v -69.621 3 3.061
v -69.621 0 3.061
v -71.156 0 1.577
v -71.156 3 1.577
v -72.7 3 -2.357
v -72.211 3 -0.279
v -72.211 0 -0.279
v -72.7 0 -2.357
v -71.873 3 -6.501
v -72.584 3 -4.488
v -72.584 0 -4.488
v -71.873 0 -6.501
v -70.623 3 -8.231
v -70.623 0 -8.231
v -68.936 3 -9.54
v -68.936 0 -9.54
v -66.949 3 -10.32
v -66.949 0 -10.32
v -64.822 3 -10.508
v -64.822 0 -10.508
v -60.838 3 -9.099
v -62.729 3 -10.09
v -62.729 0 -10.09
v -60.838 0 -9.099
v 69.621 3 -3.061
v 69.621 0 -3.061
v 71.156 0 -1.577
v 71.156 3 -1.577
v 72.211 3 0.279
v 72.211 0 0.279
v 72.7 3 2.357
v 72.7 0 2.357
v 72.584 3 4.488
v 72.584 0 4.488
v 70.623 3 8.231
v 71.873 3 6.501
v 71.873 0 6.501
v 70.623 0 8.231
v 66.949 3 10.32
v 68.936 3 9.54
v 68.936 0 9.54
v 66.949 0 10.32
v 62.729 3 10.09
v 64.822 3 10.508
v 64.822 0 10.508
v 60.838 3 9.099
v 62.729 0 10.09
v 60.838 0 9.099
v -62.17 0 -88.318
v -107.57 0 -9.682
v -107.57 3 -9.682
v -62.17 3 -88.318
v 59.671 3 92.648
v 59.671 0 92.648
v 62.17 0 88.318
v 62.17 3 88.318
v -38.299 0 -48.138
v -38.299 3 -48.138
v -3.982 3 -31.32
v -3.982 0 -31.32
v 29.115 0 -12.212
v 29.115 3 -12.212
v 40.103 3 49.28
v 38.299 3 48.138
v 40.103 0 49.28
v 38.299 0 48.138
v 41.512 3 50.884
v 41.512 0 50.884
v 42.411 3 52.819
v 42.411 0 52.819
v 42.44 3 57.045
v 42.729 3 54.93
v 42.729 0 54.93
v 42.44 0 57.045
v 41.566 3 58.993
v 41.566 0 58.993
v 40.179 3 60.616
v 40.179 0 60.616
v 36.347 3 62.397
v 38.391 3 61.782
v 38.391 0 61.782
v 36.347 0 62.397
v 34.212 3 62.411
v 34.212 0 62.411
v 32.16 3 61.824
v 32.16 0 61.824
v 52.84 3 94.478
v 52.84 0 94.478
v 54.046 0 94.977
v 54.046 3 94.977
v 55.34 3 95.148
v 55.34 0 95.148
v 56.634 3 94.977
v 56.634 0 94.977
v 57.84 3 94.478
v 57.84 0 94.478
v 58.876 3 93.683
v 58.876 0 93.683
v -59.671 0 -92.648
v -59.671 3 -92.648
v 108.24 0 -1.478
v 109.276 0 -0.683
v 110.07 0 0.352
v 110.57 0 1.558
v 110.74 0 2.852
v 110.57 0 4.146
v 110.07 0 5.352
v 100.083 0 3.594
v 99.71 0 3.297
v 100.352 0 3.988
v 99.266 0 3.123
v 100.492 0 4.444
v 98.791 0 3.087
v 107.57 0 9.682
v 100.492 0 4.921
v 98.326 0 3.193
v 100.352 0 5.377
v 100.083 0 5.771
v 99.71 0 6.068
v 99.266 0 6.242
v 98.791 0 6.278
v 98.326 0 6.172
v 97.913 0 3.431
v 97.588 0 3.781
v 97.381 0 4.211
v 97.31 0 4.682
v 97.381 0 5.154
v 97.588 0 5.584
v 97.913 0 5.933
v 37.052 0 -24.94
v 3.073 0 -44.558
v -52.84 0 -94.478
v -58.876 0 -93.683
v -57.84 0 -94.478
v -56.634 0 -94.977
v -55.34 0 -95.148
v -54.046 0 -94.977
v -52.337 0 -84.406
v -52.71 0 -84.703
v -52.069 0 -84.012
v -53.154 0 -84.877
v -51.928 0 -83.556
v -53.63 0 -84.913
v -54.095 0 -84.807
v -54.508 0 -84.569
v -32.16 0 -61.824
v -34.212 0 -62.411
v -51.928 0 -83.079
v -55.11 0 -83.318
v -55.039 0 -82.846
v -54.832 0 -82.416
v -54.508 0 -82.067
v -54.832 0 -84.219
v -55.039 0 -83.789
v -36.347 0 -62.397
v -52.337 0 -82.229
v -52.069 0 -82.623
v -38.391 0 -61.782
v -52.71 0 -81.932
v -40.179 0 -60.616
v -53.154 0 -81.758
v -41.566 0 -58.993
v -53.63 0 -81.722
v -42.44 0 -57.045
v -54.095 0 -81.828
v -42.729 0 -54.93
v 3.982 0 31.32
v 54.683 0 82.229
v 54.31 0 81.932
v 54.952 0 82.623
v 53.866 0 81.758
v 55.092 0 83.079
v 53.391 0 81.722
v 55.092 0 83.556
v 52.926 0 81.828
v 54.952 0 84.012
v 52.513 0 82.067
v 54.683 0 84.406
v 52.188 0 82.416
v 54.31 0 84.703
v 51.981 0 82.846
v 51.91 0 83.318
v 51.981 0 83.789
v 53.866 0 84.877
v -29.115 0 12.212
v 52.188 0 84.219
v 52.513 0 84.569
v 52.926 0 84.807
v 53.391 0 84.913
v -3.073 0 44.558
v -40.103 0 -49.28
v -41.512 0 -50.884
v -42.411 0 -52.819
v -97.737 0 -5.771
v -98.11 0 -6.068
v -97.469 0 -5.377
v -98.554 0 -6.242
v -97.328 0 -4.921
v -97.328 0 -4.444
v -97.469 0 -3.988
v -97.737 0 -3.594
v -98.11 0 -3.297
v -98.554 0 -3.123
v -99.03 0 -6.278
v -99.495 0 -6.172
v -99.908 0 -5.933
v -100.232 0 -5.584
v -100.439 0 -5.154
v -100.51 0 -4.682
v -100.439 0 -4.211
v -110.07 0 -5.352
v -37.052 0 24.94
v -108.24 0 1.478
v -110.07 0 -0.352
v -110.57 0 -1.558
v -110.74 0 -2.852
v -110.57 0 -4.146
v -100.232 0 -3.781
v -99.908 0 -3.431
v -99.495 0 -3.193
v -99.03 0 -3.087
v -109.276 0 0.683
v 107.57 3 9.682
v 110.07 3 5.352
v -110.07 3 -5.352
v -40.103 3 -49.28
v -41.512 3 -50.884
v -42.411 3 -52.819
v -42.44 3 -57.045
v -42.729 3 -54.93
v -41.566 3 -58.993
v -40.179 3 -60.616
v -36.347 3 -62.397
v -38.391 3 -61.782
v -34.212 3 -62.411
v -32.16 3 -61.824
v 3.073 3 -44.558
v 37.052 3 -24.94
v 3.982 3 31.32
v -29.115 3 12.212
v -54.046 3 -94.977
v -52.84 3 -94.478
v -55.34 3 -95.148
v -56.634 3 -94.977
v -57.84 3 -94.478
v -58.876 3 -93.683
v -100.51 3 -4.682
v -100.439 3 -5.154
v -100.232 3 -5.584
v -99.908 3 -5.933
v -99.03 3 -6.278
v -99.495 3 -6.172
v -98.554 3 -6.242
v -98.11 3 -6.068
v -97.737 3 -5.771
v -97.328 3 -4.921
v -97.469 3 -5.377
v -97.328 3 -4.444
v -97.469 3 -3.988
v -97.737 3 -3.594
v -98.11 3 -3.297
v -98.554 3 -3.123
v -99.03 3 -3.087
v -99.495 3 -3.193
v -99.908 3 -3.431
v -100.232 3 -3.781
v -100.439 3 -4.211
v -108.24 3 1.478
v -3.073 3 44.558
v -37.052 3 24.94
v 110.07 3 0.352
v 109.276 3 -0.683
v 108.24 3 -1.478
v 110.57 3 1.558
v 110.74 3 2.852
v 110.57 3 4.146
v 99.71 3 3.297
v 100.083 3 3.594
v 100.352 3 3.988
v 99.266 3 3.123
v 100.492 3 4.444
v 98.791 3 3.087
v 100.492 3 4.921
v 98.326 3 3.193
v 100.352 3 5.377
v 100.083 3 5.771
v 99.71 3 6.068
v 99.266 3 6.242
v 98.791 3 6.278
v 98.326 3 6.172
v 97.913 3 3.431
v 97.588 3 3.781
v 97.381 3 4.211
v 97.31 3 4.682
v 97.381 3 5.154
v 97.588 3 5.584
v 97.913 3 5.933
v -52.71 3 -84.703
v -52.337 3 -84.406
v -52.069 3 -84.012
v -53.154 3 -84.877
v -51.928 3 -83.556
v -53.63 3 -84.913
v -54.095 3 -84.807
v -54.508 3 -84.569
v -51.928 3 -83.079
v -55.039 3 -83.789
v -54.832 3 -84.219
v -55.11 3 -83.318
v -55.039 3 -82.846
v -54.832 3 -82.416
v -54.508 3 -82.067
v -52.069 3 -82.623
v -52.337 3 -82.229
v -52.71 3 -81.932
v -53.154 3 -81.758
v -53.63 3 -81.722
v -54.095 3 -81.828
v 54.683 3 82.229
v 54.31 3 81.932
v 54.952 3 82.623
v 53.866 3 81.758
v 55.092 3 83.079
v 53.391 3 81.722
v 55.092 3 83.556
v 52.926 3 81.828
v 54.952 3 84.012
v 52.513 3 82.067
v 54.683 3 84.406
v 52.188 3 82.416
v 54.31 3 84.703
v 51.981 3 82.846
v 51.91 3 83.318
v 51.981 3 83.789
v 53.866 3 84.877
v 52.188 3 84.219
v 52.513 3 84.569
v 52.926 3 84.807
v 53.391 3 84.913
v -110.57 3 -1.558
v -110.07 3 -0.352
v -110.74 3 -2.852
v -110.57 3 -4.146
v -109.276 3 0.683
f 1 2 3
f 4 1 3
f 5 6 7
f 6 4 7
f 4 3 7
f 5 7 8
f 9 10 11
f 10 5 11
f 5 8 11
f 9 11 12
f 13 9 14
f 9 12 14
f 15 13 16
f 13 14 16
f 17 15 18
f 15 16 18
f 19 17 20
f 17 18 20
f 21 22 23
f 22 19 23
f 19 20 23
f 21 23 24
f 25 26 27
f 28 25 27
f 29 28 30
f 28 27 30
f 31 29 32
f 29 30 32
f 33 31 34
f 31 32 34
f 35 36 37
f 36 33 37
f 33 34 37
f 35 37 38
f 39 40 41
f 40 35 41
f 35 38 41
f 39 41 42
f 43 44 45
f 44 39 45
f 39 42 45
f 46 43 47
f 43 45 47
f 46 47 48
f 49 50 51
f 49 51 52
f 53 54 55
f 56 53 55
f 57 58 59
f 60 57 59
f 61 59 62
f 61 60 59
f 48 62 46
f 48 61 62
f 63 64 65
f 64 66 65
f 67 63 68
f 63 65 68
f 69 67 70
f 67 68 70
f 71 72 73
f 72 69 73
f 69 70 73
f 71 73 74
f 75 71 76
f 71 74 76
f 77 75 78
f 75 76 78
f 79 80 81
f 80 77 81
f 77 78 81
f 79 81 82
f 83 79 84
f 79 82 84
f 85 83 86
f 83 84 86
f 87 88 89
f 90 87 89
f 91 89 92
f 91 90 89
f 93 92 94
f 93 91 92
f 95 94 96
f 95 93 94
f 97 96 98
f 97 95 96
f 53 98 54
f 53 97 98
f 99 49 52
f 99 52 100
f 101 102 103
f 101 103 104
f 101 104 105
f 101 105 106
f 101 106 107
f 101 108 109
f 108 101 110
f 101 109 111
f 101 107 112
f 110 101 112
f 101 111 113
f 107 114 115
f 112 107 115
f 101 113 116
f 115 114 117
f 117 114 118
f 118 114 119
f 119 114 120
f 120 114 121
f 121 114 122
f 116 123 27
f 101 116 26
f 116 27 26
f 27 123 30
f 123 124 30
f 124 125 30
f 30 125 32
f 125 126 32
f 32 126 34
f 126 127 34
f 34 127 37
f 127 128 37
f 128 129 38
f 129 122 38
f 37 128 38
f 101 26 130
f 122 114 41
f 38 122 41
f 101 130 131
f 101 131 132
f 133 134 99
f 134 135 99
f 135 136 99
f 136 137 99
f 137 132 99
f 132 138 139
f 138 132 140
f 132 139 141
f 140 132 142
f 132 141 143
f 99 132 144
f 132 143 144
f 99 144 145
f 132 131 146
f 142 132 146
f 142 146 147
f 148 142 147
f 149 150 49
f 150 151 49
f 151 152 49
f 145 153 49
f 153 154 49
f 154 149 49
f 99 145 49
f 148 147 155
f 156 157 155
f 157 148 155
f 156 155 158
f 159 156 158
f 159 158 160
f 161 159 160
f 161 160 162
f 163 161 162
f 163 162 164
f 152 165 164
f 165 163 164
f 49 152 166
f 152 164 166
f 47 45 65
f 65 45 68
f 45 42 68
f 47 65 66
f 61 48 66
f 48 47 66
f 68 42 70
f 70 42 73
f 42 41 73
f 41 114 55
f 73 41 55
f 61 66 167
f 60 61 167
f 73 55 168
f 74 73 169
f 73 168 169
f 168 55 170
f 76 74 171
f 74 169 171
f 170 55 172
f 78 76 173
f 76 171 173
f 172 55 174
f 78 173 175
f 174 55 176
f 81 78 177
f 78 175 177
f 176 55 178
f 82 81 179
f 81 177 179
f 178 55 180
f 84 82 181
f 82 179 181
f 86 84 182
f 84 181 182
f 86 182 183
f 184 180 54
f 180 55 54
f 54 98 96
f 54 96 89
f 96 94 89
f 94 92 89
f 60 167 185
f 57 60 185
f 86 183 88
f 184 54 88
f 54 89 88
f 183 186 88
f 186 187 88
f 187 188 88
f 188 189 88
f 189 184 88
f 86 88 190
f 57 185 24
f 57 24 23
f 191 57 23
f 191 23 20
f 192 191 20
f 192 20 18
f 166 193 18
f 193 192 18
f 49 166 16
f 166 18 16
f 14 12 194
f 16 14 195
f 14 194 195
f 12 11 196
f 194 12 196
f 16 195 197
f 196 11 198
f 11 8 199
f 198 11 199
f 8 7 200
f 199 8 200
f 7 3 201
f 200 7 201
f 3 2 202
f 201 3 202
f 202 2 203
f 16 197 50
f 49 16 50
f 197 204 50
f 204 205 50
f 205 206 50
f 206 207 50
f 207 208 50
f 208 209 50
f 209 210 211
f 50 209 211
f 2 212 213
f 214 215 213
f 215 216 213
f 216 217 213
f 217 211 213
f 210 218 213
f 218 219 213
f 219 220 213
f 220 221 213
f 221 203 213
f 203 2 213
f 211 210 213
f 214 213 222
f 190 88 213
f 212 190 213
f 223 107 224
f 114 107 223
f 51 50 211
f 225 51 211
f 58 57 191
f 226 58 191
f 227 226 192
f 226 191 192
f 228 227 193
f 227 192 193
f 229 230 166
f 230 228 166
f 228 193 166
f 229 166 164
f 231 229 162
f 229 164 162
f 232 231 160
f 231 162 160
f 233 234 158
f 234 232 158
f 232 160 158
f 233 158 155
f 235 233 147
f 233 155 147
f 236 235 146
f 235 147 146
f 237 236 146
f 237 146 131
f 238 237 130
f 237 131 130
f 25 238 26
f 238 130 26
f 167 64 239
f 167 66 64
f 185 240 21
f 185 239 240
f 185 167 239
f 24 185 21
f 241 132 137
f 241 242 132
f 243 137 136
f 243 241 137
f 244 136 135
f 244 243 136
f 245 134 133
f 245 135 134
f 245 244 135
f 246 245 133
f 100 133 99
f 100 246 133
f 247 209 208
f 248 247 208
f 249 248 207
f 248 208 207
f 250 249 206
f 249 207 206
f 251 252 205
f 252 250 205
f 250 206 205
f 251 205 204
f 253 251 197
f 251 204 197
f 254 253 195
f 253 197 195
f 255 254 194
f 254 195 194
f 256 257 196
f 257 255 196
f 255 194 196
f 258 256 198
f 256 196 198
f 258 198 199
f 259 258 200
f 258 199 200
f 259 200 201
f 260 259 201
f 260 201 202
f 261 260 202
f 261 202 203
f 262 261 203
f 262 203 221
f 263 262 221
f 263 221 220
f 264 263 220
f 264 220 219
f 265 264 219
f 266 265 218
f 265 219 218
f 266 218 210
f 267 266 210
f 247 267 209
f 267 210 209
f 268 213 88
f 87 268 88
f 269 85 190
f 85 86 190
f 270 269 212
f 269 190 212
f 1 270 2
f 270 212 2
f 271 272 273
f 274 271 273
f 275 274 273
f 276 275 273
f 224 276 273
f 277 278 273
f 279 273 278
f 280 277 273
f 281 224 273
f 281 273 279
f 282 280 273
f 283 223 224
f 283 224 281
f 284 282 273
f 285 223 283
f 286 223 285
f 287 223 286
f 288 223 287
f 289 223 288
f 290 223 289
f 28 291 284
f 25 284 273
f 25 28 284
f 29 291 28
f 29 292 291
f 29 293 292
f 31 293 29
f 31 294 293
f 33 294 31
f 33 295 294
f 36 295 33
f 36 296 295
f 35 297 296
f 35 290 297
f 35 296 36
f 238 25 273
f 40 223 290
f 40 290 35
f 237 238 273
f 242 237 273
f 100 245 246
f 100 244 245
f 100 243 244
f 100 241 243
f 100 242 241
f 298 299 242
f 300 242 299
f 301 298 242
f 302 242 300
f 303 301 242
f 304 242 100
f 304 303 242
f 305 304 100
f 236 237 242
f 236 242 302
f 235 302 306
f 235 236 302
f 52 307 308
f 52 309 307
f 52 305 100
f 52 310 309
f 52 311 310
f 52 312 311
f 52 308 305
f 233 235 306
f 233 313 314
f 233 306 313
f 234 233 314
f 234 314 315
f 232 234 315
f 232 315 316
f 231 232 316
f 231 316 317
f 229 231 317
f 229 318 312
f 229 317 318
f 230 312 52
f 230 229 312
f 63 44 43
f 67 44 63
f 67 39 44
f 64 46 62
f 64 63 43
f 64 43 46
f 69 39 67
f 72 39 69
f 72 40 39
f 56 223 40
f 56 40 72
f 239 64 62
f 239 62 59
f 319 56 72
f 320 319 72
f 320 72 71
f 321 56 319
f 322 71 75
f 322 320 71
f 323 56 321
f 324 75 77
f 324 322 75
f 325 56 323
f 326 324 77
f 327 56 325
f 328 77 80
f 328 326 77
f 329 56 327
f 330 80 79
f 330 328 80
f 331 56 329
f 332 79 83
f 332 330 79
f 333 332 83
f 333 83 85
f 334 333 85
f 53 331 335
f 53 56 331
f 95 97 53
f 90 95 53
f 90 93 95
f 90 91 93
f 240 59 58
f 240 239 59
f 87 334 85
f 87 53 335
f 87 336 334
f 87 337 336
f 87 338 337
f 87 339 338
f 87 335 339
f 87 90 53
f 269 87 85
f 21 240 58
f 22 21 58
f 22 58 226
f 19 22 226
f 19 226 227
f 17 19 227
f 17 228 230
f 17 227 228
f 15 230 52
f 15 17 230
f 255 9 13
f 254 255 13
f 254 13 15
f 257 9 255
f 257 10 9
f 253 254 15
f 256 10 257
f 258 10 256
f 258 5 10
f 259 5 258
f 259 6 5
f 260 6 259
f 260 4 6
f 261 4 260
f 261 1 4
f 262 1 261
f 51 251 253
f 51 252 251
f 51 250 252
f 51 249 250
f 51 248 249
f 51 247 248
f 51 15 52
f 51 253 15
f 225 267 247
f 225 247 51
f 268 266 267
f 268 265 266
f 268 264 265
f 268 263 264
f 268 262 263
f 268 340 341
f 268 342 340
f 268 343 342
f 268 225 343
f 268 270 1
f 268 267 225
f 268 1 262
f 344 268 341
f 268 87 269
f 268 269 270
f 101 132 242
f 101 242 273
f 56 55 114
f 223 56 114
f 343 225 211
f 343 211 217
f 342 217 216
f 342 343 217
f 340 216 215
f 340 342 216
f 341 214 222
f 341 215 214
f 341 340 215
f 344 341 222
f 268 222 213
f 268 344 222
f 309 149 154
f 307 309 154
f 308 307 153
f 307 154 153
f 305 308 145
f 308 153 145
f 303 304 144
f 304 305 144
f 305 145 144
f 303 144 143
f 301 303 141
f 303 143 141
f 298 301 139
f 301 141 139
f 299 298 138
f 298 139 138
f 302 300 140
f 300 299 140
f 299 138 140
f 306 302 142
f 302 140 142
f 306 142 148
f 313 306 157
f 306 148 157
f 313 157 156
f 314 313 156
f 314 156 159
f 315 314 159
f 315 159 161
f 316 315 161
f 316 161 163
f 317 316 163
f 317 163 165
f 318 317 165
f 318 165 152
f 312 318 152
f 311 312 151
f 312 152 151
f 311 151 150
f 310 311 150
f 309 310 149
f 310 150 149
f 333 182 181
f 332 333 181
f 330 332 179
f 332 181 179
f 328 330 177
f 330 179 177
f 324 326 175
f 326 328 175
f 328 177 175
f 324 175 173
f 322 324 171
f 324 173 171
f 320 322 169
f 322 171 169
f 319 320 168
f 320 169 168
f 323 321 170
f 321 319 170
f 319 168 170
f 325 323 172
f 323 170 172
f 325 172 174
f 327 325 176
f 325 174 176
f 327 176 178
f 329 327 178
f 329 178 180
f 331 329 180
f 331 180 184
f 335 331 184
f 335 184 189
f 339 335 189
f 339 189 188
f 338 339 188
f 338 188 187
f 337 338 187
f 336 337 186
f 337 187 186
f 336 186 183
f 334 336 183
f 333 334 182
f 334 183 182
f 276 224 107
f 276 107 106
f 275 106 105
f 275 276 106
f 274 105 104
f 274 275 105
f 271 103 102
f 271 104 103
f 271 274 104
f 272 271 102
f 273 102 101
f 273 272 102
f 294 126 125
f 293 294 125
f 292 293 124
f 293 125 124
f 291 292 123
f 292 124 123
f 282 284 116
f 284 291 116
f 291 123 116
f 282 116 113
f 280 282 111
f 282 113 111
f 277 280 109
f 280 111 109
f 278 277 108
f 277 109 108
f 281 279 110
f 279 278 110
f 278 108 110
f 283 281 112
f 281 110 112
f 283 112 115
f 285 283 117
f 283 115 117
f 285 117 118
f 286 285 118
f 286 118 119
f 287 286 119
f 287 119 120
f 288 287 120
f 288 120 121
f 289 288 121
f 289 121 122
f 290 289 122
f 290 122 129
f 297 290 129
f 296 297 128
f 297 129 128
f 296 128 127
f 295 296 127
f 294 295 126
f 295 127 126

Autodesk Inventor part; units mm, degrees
ref_plane "YZ Plane" through (0, 0, 0) normal (1, 0, 0) x (0, 1, 0)
ref_plane "XZ Plane" through (0, 0, 0) normal (0, 1, 0) x (-1, 0, 0)
ref_plane "XY Plane" through (0, 0, 0) normal (0, 0, 1) x (1, 0, 0)
sketch "Sketch1" plane through (0, 0, 0) normal (0, 1, 0) x (-1, 0, 0)
  circle A0 centre (98.9102, -4.6824) radius 1.6
  circle A1 centre (53.5102, -83.3176) radius 1.6
  circle A2 centre (-98.9102, 4.6824) radius 1.6
  circle A3 centre (-53.5102, 83.3176) radius 1.6
  line L0 (107.5705, -9.6824) -> (62.1705, -88.3176)
  line L1 (-62.1705, 88.3176) -> (-107.5705, 9.6824)
  line L2 (107.5705, -9.6824) -> (112.5705, -1.0222)
  line L3 (112.5705, -1.0222) -> (-57.1705, 96.9778)
  line L4 (112.5705, -1.0222) -> (308.5705, -1.0222) construction
  line L5 (-57.1705, 96.9778) -> (-62.1705, 88.3176)
  line L6 (62.1705, -88.3176) -> (57.1705, -96.9778)
  line L7 (57.1705, -96.9778) -> (-112.5705, 1.0222)
  line L8 (-112.5705, 1.0222) -> (-107.5705, 9.6824)
  line L9 (-15, -25.9808) -> (43, -25.9808) construction
  arc A4 (69.6208, 3.0607) -> (-32.1598, 61.8238) centre (-268.5566, -465.1538) ccw
  arc A5 (60.8381, -9.0992) -> (-38.2992, 48.1377) centre (-268.5566, -465.1538) ccw
  arc A6 (60.8381, -9.0992) -> (69.6208, 3.0607) centre (65.2295, -3.0192) ccw
  arc A7 (-32.1598, 61.8238) -> (-38.2992, 48.1377) centre (-35.2295, 54.9808) ccw
  arc A8 (69.6208, 3.0607) -> (-32.1598, 61.8238) centre (-268.5566, -465.1538) ccw
  arc A9 (60.8381, -9.0992) -> (-38.2992, 48.1377) centre (-268.5566, -465.1538) ccw
  arc A10 (-32.1598, 61.8238) -> (-38.2992, 48.1377) centre (-35.2295, 54.9808) ccw
  arc A11 (60.8381, -9.0992) -> (69.6208, 3.0607) centre (65.2295, -3.0192) ccw
  arc A12 (-69.6208, -3.0607) -> (32.1598, -61.8238) centre (268.5566, 465.1538) ccw
  arc A13 (-60.8381, 9.0992) -> (38.2992, -48.1377) centre (268.5566, 465.1538) ccw
  arc A14 (-60.8381, 9.0992) -> (-69.6208, -3.0607) centre (-65.2295, 3.0192) ccw
  arc A15 (32.1598, -61.8238) -> (38.2992, -48.1377) centre (35.2295, -54.9808) ccw
  point P0 (-50, -7)
  point P1 (-50, -17)
  point P2 (31.0622, -39.8013)
  point P3 (39.7224, -34.8013)
  point P4 (-31.0622, 39.8013)
  point P5 (-39.7224, 34.8013)
  point P6 (50, 7)
  point P7 (50, 17)
  point P8 (18.9378, 46.8013)
  point P9 (10.2776, 51.8013)
  point P10 (-18.9378, -46.8013)
  point P11 (-10.2776, -51.8013)
  point P12 (32.1598, -61.8238)
  dimension "d116" = 10
  dimension "d117" = 10
  dimension "d119" = 150
  dimension "d121" = 90
  dimension "d134" = 15
extrude "Extrusion5" add sketch "Sketch1" along normal blind 3
fillet "Fillet4" radius 5 4 edges at (57.1705, 1.5, 96.9778) (112.5705, 1.5, 1.0222) (-112.5705, 1.5, -1.0222) (-57.1705, 1.5, -96.9778)
properties part number "Tempat Batere"
